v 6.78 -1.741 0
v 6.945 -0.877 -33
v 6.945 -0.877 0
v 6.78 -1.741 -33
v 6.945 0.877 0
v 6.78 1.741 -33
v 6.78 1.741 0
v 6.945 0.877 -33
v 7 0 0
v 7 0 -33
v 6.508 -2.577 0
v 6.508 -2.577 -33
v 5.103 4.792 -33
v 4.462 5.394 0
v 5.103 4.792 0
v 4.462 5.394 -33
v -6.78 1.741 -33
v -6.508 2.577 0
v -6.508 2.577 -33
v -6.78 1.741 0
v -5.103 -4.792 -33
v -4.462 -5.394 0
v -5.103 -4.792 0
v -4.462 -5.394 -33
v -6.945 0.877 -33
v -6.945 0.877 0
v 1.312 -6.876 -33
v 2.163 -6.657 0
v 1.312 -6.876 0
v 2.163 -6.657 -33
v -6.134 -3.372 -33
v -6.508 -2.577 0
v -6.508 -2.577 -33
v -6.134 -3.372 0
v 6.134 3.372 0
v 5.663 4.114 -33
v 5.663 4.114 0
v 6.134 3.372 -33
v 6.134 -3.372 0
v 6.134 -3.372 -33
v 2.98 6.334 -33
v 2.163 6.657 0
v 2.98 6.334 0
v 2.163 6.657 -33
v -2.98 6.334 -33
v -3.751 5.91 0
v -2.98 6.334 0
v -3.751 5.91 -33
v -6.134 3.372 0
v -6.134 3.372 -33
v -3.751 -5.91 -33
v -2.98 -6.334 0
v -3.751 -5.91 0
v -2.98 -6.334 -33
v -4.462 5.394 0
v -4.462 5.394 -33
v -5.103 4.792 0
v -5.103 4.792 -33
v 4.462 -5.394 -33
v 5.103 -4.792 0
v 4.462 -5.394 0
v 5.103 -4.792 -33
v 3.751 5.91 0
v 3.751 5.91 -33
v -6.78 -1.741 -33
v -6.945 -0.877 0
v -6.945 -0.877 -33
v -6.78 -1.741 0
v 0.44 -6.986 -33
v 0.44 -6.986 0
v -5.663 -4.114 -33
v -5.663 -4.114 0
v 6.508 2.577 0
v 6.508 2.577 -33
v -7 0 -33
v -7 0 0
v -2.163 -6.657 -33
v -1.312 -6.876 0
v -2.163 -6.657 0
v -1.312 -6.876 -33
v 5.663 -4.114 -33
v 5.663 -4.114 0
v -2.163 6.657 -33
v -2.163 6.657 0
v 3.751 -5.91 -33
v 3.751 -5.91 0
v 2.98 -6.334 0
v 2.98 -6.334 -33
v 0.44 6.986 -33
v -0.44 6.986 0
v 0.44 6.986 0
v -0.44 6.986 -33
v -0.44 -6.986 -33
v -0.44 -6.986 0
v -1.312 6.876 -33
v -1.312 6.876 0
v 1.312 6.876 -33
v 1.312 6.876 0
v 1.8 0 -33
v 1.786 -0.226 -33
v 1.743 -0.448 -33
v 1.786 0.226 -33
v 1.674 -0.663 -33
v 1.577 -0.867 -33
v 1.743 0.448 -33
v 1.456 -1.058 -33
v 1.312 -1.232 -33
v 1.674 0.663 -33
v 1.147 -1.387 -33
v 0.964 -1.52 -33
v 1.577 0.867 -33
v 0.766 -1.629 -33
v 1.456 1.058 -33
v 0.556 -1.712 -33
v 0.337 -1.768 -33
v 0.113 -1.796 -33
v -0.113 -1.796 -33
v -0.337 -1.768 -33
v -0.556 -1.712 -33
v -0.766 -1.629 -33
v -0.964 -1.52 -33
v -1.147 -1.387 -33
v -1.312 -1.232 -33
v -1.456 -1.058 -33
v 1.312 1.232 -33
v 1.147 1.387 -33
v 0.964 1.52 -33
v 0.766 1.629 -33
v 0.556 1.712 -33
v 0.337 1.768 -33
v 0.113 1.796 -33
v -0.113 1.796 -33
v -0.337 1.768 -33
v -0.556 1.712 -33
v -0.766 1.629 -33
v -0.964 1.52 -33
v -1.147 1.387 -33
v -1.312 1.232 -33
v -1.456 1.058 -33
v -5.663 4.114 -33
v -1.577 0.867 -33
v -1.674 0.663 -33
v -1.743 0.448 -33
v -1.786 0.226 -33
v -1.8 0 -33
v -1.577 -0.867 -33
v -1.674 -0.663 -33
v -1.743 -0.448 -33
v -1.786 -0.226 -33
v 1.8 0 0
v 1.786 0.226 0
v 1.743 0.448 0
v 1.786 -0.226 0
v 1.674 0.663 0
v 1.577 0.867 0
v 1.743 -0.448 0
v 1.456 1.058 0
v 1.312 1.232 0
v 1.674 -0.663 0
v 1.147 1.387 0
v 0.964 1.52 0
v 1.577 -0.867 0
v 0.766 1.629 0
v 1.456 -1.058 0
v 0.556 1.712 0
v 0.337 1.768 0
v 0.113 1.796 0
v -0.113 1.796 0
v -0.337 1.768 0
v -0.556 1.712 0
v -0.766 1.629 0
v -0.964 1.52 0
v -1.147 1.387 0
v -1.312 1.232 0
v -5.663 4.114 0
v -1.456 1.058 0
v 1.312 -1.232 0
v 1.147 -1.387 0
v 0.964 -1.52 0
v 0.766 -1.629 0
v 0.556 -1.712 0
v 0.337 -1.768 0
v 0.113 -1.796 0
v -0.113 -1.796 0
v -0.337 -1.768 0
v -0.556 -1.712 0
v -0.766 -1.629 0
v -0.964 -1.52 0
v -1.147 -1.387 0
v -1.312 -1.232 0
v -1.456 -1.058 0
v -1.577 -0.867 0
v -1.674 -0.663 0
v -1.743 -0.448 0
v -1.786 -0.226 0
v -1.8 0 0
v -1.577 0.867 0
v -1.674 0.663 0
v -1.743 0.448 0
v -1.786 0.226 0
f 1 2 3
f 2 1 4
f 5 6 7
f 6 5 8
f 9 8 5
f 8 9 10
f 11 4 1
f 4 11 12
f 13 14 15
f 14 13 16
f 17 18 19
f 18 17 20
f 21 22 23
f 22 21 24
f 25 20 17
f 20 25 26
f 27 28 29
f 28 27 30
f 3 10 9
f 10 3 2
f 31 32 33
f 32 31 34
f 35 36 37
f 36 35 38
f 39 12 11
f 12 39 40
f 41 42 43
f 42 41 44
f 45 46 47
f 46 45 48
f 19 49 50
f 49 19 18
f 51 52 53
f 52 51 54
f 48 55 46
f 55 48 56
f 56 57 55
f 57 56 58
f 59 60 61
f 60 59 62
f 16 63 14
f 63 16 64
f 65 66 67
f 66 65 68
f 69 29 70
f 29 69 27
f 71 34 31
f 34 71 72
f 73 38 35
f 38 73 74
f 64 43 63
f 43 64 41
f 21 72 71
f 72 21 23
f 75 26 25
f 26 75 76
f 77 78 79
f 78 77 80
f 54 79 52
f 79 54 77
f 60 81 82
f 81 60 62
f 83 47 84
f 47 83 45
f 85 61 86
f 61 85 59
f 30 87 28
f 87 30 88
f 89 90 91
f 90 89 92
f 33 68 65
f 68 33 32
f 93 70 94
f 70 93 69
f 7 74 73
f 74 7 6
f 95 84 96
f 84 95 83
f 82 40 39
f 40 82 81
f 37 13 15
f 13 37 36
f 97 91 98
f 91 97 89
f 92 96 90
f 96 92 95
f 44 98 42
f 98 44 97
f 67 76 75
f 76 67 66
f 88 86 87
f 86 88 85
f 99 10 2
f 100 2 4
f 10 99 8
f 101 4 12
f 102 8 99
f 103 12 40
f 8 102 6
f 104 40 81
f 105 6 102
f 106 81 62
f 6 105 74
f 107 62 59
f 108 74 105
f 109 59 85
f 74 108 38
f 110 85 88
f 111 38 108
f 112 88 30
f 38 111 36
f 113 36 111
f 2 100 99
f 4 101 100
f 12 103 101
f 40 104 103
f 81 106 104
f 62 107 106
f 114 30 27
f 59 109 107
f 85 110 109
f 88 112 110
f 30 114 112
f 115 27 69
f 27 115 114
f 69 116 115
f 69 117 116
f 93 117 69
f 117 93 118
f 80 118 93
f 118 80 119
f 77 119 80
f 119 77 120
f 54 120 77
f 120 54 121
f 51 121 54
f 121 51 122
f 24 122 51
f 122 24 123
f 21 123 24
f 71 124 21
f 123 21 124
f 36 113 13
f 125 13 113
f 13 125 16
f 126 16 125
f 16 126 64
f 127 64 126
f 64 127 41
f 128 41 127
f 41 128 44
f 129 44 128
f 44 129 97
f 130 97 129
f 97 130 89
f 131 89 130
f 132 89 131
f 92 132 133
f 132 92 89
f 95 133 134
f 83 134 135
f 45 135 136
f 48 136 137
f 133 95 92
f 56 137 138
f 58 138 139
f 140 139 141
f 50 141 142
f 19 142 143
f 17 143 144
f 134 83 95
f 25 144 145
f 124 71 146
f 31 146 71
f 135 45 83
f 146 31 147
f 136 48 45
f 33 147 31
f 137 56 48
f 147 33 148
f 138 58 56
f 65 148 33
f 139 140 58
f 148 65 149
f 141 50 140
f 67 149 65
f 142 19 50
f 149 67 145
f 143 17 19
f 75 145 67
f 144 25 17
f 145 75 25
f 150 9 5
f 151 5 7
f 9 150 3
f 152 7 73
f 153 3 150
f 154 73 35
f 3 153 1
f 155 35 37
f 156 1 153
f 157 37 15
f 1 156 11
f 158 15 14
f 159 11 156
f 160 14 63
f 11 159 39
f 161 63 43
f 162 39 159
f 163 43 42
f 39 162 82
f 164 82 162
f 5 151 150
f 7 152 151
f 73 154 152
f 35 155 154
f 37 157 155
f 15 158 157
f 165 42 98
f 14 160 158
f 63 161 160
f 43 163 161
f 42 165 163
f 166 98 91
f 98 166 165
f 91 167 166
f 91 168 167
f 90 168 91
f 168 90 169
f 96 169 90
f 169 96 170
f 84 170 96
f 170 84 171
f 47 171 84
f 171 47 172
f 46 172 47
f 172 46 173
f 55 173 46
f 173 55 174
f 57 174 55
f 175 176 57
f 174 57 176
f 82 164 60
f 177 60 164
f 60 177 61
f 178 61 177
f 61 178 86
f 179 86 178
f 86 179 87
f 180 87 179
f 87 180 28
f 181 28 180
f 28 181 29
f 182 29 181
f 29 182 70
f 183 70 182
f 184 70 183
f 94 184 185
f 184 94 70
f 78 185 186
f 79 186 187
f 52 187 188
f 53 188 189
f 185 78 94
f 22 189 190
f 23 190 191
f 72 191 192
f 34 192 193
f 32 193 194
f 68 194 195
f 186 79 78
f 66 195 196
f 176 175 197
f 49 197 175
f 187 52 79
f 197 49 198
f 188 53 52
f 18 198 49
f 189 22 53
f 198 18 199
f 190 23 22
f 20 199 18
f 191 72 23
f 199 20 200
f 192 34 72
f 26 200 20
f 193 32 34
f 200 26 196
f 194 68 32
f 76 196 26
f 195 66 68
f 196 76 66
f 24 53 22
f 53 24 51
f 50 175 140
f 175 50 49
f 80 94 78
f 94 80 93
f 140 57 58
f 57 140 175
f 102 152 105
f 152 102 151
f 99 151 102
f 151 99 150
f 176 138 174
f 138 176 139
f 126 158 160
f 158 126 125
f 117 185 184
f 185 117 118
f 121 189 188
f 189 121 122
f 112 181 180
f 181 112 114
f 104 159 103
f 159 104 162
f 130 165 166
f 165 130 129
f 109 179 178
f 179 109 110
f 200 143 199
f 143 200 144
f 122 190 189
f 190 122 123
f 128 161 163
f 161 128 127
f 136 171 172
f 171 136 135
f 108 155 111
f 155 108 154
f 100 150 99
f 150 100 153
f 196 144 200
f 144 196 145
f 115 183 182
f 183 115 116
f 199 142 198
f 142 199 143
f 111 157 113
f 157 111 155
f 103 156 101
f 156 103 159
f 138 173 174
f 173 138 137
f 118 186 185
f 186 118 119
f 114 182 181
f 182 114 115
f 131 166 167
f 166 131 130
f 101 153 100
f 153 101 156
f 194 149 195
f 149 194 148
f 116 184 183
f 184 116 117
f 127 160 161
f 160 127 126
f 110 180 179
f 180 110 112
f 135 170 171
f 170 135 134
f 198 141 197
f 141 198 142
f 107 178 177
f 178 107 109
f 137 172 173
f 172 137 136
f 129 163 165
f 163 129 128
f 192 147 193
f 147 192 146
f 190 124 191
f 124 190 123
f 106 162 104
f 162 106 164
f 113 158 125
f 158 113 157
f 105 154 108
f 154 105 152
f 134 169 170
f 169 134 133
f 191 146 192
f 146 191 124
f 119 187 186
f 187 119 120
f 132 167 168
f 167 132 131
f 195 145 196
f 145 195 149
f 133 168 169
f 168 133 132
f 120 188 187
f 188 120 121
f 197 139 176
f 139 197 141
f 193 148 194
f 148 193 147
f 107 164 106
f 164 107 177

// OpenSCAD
$fn = 50;


difference() {
	union() {
		translate(v = [0, 0, -33.0000000000]) {
			cylinder(h = 33, r = 7.0000000000);
		}
		cylinder(h = 0, r = 10.0000000000);
	}
	union() {
		#translate(v = [0, 0, -33]) {
			cylinder(h = 33, r = 1.8000000000);
		}
	}
}
